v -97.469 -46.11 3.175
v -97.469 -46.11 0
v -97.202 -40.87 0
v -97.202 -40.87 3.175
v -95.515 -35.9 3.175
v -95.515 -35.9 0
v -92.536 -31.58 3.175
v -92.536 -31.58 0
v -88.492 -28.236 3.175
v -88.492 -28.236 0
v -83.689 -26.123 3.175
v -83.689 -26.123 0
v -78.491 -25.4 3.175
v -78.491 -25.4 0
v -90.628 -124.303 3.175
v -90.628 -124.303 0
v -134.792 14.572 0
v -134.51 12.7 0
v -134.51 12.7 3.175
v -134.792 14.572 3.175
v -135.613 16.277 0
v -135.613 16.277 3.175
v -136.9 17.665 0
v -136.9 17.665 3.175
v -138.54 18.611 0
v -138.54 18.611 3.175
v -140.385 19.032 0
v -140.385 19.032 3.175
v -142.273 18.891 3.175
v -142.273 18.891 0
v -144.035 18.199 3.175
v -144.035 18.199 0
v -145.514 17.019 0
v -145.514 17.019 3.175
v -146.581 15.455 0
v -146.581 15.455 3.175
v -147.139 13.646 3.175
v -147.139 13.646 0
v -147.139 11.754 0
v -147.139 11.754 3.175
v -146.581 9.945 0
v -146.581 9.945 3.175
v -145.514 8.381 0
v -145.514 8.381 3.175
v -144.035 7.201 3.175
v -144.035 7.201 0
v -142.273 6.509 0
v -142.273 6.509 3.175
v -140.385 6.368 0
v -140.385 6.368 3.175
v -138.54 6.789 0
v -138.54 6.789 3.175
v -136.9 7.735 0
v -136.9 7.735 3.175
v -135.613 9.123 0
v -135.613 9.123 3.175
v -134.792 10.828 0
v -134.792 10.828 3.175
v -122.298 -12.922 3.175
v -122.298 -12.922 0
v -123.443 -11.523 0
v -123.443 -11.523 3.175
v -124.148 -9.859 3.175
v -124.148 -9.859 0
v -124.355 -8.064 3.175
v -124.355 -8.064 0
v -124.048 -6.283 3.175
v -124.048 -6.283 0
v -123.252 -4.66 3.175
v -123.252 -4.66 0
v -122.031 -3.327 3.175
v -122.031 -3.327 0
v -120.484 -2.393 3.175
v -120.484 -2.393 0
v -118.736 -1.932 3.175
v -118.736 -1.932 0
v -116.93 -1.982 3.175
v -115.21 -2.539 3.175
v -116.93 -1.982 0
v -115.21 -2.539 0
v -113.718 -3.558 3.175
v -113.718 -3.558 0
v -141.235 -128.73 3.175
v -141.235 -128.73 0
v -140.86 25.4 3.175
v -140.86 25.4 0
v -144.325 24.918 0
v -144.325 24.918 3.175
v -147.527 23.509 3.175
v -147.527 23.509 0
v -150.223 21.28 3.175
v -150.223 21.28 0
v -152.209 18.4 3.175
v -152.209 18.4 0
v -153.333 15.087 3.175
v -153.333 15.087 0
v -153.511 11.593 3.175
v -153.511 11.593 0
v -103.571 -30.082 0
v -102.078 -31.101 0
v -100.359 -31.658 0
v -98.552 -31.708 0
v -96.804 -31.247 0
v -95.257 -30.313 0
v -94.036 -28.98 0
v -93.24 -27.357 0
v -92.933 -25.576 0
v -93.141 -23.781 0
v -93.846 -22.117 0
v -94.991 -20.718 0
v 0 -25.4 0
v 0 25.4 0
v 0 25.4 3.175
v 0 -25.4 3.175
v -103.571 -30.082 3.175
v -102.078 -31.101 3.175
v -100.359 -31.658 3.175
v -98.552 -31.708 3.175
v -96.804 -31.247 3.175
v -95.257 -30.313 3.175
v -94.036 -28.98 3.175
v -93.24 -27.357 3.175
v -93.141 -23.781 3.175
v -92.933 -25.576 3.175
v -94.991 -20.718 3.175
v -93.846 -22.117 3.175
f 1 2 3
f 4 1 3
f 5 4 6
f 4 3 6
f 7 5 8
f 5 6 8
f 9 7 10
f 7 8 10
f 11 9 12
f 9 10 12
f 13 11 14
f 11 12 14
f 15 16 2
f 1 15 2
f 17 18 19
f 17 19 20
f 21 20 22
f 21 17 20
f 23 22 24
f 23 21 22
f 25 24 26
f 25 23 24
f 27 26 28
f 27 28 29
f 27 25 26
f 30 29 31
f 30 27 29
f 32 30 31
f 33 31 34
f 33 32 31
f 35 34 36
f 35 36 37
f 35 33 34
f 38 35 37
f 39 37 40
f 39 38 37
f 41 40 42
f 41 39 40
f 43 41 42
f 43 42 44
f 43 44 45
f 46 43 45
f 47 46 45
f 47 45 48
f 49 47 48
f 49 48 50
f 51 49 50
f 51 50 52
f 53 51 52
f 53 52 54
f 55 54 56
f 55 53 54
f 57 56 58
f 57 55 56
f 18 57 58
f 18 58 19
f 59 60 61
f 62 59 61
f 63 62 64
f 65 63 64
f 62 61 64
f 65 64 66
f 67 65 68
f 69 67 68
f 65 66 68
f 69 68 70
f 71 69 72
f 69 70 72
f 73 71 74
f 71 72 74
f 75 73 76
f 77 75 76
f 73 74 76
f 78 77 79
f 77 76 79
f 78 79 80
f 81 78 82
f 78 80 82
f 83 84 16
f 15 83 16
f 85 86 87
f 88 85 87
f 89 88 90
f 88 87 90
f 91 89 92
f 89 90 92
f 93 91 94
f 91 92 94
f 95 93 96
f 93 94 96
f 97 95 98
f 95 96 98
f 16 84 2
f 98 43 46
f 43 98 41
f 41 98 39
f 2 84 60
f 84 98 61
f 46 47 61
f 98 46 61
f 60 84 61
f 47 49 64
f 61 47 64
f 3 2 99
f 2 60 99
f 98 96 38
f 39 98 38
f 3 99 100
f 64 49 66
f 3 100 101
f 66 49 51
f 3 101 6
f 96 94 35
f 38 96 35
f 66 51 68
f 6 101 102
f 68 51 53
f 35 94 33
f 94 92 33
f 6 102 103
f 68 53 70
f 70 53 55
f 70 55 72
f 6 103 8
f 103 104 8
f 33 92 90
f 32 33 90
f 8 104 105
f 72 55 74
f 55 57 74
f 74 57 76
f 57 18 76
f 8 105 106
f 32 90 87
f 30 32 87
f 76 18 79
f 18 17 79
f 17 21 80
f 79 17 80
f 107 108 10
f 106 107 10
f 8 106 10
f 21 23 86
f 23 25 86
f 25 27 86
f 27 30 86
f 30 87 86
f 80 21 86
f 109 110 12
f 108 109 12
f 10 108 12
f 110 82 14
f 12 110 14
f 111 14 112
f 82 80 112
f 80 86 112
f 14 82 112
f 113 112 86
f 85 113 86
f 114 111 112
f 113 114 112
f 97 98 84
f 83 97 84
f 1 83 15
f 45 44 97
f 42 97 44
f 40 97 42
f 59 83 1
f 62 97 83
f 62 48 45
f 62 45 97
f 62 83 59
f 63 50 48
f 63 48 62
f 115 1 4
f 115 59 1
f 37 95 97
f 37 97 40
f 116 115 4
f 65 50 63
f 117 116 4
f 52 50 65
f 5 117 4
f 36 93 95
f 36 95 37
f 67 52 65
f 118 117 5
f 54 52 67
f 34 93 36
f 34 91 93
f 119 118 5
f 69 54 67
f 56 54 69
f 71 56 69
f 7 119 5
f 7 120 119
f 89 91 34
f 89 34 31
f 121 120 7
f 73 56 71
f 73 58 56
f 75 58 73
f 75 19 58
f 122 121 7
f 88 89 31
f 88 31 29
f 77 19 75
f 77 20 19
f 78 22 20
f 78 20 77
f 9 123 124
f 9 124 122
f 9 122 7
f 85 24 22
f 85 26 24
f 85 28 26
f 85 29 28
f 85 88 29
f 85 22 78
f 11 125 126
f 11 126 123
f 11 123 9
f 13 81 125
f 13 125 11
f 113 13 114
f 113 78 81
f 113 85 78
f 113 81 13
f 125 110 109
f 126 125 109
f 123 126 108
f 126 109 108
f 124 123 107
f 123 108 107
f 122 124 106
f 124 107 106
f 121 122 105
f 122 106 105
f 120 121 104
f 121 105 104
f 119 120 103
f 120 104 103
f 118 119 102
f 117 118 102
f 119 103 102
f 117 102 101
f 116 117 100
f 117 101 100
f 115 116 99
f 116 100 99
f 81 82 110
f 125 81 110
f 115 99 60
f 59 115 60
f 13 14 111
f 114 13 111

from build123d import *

# Parameters (mm, degrees)
SKETCH1_R           = 6.35
BOSS_EXTRUDE1_DEPTH = 3.175


with BuildPart() as part:
    # Sketch1 → Boss-Extrude1 (new body)
    with BuildSketch(Plane.XY):
        with BuildLine():
            Line((-141.234566003, -128.730482523), (-90.62787534, -124.302970792))
            Line((-90.62787534, -124.302970792), (-97.468846126, -46.110316899))
            ThreePointArc((-97.468846126, -46.110316899), (-92.536470394, -31.580006545), (-78.491337127, -25.4))
            Line((-78.491337127, -25.4), (0, -25.4))
            Line((0, -25.4), (0, 25.4))
            Line((0, 25.4), (-140.859617964, 25.4))
            ThreePointArc((-140.859617964, 25.4), (-150.223040141, 21.279995637), (-153.511290629, 11.593122067))
            Line((-153.511290629, 11.593122067), (-141.234566003, -128.730482523))
        make_face()
        with Locations((-140.859617964, 12.7)):
            Circle(SKETCH1_R, mode=Mode.SUBTRACT)
        with BuildLine():
            Line((-103.570761891, -30.081711089), (-122.297606246, -12.921719815))
            ThreePointArc((-122.297606246, -12.921719815), (-122.689319517, -3.950010908), (-113.717610609, -3.558297638))
            Line((-113.717610609, -3.558297638), (-94.990766254, -20.718288911))
            ThreePointArc((-94.990766254, -20.718288911), (-94.599052984, -29.689997818), (-103.570761891, -30.081711089))
        make_face(mode=Mode.SUBTRACT)
    extrude(amount=BOSS_EXTRUDE1_DEPTH)


solid = part.part
